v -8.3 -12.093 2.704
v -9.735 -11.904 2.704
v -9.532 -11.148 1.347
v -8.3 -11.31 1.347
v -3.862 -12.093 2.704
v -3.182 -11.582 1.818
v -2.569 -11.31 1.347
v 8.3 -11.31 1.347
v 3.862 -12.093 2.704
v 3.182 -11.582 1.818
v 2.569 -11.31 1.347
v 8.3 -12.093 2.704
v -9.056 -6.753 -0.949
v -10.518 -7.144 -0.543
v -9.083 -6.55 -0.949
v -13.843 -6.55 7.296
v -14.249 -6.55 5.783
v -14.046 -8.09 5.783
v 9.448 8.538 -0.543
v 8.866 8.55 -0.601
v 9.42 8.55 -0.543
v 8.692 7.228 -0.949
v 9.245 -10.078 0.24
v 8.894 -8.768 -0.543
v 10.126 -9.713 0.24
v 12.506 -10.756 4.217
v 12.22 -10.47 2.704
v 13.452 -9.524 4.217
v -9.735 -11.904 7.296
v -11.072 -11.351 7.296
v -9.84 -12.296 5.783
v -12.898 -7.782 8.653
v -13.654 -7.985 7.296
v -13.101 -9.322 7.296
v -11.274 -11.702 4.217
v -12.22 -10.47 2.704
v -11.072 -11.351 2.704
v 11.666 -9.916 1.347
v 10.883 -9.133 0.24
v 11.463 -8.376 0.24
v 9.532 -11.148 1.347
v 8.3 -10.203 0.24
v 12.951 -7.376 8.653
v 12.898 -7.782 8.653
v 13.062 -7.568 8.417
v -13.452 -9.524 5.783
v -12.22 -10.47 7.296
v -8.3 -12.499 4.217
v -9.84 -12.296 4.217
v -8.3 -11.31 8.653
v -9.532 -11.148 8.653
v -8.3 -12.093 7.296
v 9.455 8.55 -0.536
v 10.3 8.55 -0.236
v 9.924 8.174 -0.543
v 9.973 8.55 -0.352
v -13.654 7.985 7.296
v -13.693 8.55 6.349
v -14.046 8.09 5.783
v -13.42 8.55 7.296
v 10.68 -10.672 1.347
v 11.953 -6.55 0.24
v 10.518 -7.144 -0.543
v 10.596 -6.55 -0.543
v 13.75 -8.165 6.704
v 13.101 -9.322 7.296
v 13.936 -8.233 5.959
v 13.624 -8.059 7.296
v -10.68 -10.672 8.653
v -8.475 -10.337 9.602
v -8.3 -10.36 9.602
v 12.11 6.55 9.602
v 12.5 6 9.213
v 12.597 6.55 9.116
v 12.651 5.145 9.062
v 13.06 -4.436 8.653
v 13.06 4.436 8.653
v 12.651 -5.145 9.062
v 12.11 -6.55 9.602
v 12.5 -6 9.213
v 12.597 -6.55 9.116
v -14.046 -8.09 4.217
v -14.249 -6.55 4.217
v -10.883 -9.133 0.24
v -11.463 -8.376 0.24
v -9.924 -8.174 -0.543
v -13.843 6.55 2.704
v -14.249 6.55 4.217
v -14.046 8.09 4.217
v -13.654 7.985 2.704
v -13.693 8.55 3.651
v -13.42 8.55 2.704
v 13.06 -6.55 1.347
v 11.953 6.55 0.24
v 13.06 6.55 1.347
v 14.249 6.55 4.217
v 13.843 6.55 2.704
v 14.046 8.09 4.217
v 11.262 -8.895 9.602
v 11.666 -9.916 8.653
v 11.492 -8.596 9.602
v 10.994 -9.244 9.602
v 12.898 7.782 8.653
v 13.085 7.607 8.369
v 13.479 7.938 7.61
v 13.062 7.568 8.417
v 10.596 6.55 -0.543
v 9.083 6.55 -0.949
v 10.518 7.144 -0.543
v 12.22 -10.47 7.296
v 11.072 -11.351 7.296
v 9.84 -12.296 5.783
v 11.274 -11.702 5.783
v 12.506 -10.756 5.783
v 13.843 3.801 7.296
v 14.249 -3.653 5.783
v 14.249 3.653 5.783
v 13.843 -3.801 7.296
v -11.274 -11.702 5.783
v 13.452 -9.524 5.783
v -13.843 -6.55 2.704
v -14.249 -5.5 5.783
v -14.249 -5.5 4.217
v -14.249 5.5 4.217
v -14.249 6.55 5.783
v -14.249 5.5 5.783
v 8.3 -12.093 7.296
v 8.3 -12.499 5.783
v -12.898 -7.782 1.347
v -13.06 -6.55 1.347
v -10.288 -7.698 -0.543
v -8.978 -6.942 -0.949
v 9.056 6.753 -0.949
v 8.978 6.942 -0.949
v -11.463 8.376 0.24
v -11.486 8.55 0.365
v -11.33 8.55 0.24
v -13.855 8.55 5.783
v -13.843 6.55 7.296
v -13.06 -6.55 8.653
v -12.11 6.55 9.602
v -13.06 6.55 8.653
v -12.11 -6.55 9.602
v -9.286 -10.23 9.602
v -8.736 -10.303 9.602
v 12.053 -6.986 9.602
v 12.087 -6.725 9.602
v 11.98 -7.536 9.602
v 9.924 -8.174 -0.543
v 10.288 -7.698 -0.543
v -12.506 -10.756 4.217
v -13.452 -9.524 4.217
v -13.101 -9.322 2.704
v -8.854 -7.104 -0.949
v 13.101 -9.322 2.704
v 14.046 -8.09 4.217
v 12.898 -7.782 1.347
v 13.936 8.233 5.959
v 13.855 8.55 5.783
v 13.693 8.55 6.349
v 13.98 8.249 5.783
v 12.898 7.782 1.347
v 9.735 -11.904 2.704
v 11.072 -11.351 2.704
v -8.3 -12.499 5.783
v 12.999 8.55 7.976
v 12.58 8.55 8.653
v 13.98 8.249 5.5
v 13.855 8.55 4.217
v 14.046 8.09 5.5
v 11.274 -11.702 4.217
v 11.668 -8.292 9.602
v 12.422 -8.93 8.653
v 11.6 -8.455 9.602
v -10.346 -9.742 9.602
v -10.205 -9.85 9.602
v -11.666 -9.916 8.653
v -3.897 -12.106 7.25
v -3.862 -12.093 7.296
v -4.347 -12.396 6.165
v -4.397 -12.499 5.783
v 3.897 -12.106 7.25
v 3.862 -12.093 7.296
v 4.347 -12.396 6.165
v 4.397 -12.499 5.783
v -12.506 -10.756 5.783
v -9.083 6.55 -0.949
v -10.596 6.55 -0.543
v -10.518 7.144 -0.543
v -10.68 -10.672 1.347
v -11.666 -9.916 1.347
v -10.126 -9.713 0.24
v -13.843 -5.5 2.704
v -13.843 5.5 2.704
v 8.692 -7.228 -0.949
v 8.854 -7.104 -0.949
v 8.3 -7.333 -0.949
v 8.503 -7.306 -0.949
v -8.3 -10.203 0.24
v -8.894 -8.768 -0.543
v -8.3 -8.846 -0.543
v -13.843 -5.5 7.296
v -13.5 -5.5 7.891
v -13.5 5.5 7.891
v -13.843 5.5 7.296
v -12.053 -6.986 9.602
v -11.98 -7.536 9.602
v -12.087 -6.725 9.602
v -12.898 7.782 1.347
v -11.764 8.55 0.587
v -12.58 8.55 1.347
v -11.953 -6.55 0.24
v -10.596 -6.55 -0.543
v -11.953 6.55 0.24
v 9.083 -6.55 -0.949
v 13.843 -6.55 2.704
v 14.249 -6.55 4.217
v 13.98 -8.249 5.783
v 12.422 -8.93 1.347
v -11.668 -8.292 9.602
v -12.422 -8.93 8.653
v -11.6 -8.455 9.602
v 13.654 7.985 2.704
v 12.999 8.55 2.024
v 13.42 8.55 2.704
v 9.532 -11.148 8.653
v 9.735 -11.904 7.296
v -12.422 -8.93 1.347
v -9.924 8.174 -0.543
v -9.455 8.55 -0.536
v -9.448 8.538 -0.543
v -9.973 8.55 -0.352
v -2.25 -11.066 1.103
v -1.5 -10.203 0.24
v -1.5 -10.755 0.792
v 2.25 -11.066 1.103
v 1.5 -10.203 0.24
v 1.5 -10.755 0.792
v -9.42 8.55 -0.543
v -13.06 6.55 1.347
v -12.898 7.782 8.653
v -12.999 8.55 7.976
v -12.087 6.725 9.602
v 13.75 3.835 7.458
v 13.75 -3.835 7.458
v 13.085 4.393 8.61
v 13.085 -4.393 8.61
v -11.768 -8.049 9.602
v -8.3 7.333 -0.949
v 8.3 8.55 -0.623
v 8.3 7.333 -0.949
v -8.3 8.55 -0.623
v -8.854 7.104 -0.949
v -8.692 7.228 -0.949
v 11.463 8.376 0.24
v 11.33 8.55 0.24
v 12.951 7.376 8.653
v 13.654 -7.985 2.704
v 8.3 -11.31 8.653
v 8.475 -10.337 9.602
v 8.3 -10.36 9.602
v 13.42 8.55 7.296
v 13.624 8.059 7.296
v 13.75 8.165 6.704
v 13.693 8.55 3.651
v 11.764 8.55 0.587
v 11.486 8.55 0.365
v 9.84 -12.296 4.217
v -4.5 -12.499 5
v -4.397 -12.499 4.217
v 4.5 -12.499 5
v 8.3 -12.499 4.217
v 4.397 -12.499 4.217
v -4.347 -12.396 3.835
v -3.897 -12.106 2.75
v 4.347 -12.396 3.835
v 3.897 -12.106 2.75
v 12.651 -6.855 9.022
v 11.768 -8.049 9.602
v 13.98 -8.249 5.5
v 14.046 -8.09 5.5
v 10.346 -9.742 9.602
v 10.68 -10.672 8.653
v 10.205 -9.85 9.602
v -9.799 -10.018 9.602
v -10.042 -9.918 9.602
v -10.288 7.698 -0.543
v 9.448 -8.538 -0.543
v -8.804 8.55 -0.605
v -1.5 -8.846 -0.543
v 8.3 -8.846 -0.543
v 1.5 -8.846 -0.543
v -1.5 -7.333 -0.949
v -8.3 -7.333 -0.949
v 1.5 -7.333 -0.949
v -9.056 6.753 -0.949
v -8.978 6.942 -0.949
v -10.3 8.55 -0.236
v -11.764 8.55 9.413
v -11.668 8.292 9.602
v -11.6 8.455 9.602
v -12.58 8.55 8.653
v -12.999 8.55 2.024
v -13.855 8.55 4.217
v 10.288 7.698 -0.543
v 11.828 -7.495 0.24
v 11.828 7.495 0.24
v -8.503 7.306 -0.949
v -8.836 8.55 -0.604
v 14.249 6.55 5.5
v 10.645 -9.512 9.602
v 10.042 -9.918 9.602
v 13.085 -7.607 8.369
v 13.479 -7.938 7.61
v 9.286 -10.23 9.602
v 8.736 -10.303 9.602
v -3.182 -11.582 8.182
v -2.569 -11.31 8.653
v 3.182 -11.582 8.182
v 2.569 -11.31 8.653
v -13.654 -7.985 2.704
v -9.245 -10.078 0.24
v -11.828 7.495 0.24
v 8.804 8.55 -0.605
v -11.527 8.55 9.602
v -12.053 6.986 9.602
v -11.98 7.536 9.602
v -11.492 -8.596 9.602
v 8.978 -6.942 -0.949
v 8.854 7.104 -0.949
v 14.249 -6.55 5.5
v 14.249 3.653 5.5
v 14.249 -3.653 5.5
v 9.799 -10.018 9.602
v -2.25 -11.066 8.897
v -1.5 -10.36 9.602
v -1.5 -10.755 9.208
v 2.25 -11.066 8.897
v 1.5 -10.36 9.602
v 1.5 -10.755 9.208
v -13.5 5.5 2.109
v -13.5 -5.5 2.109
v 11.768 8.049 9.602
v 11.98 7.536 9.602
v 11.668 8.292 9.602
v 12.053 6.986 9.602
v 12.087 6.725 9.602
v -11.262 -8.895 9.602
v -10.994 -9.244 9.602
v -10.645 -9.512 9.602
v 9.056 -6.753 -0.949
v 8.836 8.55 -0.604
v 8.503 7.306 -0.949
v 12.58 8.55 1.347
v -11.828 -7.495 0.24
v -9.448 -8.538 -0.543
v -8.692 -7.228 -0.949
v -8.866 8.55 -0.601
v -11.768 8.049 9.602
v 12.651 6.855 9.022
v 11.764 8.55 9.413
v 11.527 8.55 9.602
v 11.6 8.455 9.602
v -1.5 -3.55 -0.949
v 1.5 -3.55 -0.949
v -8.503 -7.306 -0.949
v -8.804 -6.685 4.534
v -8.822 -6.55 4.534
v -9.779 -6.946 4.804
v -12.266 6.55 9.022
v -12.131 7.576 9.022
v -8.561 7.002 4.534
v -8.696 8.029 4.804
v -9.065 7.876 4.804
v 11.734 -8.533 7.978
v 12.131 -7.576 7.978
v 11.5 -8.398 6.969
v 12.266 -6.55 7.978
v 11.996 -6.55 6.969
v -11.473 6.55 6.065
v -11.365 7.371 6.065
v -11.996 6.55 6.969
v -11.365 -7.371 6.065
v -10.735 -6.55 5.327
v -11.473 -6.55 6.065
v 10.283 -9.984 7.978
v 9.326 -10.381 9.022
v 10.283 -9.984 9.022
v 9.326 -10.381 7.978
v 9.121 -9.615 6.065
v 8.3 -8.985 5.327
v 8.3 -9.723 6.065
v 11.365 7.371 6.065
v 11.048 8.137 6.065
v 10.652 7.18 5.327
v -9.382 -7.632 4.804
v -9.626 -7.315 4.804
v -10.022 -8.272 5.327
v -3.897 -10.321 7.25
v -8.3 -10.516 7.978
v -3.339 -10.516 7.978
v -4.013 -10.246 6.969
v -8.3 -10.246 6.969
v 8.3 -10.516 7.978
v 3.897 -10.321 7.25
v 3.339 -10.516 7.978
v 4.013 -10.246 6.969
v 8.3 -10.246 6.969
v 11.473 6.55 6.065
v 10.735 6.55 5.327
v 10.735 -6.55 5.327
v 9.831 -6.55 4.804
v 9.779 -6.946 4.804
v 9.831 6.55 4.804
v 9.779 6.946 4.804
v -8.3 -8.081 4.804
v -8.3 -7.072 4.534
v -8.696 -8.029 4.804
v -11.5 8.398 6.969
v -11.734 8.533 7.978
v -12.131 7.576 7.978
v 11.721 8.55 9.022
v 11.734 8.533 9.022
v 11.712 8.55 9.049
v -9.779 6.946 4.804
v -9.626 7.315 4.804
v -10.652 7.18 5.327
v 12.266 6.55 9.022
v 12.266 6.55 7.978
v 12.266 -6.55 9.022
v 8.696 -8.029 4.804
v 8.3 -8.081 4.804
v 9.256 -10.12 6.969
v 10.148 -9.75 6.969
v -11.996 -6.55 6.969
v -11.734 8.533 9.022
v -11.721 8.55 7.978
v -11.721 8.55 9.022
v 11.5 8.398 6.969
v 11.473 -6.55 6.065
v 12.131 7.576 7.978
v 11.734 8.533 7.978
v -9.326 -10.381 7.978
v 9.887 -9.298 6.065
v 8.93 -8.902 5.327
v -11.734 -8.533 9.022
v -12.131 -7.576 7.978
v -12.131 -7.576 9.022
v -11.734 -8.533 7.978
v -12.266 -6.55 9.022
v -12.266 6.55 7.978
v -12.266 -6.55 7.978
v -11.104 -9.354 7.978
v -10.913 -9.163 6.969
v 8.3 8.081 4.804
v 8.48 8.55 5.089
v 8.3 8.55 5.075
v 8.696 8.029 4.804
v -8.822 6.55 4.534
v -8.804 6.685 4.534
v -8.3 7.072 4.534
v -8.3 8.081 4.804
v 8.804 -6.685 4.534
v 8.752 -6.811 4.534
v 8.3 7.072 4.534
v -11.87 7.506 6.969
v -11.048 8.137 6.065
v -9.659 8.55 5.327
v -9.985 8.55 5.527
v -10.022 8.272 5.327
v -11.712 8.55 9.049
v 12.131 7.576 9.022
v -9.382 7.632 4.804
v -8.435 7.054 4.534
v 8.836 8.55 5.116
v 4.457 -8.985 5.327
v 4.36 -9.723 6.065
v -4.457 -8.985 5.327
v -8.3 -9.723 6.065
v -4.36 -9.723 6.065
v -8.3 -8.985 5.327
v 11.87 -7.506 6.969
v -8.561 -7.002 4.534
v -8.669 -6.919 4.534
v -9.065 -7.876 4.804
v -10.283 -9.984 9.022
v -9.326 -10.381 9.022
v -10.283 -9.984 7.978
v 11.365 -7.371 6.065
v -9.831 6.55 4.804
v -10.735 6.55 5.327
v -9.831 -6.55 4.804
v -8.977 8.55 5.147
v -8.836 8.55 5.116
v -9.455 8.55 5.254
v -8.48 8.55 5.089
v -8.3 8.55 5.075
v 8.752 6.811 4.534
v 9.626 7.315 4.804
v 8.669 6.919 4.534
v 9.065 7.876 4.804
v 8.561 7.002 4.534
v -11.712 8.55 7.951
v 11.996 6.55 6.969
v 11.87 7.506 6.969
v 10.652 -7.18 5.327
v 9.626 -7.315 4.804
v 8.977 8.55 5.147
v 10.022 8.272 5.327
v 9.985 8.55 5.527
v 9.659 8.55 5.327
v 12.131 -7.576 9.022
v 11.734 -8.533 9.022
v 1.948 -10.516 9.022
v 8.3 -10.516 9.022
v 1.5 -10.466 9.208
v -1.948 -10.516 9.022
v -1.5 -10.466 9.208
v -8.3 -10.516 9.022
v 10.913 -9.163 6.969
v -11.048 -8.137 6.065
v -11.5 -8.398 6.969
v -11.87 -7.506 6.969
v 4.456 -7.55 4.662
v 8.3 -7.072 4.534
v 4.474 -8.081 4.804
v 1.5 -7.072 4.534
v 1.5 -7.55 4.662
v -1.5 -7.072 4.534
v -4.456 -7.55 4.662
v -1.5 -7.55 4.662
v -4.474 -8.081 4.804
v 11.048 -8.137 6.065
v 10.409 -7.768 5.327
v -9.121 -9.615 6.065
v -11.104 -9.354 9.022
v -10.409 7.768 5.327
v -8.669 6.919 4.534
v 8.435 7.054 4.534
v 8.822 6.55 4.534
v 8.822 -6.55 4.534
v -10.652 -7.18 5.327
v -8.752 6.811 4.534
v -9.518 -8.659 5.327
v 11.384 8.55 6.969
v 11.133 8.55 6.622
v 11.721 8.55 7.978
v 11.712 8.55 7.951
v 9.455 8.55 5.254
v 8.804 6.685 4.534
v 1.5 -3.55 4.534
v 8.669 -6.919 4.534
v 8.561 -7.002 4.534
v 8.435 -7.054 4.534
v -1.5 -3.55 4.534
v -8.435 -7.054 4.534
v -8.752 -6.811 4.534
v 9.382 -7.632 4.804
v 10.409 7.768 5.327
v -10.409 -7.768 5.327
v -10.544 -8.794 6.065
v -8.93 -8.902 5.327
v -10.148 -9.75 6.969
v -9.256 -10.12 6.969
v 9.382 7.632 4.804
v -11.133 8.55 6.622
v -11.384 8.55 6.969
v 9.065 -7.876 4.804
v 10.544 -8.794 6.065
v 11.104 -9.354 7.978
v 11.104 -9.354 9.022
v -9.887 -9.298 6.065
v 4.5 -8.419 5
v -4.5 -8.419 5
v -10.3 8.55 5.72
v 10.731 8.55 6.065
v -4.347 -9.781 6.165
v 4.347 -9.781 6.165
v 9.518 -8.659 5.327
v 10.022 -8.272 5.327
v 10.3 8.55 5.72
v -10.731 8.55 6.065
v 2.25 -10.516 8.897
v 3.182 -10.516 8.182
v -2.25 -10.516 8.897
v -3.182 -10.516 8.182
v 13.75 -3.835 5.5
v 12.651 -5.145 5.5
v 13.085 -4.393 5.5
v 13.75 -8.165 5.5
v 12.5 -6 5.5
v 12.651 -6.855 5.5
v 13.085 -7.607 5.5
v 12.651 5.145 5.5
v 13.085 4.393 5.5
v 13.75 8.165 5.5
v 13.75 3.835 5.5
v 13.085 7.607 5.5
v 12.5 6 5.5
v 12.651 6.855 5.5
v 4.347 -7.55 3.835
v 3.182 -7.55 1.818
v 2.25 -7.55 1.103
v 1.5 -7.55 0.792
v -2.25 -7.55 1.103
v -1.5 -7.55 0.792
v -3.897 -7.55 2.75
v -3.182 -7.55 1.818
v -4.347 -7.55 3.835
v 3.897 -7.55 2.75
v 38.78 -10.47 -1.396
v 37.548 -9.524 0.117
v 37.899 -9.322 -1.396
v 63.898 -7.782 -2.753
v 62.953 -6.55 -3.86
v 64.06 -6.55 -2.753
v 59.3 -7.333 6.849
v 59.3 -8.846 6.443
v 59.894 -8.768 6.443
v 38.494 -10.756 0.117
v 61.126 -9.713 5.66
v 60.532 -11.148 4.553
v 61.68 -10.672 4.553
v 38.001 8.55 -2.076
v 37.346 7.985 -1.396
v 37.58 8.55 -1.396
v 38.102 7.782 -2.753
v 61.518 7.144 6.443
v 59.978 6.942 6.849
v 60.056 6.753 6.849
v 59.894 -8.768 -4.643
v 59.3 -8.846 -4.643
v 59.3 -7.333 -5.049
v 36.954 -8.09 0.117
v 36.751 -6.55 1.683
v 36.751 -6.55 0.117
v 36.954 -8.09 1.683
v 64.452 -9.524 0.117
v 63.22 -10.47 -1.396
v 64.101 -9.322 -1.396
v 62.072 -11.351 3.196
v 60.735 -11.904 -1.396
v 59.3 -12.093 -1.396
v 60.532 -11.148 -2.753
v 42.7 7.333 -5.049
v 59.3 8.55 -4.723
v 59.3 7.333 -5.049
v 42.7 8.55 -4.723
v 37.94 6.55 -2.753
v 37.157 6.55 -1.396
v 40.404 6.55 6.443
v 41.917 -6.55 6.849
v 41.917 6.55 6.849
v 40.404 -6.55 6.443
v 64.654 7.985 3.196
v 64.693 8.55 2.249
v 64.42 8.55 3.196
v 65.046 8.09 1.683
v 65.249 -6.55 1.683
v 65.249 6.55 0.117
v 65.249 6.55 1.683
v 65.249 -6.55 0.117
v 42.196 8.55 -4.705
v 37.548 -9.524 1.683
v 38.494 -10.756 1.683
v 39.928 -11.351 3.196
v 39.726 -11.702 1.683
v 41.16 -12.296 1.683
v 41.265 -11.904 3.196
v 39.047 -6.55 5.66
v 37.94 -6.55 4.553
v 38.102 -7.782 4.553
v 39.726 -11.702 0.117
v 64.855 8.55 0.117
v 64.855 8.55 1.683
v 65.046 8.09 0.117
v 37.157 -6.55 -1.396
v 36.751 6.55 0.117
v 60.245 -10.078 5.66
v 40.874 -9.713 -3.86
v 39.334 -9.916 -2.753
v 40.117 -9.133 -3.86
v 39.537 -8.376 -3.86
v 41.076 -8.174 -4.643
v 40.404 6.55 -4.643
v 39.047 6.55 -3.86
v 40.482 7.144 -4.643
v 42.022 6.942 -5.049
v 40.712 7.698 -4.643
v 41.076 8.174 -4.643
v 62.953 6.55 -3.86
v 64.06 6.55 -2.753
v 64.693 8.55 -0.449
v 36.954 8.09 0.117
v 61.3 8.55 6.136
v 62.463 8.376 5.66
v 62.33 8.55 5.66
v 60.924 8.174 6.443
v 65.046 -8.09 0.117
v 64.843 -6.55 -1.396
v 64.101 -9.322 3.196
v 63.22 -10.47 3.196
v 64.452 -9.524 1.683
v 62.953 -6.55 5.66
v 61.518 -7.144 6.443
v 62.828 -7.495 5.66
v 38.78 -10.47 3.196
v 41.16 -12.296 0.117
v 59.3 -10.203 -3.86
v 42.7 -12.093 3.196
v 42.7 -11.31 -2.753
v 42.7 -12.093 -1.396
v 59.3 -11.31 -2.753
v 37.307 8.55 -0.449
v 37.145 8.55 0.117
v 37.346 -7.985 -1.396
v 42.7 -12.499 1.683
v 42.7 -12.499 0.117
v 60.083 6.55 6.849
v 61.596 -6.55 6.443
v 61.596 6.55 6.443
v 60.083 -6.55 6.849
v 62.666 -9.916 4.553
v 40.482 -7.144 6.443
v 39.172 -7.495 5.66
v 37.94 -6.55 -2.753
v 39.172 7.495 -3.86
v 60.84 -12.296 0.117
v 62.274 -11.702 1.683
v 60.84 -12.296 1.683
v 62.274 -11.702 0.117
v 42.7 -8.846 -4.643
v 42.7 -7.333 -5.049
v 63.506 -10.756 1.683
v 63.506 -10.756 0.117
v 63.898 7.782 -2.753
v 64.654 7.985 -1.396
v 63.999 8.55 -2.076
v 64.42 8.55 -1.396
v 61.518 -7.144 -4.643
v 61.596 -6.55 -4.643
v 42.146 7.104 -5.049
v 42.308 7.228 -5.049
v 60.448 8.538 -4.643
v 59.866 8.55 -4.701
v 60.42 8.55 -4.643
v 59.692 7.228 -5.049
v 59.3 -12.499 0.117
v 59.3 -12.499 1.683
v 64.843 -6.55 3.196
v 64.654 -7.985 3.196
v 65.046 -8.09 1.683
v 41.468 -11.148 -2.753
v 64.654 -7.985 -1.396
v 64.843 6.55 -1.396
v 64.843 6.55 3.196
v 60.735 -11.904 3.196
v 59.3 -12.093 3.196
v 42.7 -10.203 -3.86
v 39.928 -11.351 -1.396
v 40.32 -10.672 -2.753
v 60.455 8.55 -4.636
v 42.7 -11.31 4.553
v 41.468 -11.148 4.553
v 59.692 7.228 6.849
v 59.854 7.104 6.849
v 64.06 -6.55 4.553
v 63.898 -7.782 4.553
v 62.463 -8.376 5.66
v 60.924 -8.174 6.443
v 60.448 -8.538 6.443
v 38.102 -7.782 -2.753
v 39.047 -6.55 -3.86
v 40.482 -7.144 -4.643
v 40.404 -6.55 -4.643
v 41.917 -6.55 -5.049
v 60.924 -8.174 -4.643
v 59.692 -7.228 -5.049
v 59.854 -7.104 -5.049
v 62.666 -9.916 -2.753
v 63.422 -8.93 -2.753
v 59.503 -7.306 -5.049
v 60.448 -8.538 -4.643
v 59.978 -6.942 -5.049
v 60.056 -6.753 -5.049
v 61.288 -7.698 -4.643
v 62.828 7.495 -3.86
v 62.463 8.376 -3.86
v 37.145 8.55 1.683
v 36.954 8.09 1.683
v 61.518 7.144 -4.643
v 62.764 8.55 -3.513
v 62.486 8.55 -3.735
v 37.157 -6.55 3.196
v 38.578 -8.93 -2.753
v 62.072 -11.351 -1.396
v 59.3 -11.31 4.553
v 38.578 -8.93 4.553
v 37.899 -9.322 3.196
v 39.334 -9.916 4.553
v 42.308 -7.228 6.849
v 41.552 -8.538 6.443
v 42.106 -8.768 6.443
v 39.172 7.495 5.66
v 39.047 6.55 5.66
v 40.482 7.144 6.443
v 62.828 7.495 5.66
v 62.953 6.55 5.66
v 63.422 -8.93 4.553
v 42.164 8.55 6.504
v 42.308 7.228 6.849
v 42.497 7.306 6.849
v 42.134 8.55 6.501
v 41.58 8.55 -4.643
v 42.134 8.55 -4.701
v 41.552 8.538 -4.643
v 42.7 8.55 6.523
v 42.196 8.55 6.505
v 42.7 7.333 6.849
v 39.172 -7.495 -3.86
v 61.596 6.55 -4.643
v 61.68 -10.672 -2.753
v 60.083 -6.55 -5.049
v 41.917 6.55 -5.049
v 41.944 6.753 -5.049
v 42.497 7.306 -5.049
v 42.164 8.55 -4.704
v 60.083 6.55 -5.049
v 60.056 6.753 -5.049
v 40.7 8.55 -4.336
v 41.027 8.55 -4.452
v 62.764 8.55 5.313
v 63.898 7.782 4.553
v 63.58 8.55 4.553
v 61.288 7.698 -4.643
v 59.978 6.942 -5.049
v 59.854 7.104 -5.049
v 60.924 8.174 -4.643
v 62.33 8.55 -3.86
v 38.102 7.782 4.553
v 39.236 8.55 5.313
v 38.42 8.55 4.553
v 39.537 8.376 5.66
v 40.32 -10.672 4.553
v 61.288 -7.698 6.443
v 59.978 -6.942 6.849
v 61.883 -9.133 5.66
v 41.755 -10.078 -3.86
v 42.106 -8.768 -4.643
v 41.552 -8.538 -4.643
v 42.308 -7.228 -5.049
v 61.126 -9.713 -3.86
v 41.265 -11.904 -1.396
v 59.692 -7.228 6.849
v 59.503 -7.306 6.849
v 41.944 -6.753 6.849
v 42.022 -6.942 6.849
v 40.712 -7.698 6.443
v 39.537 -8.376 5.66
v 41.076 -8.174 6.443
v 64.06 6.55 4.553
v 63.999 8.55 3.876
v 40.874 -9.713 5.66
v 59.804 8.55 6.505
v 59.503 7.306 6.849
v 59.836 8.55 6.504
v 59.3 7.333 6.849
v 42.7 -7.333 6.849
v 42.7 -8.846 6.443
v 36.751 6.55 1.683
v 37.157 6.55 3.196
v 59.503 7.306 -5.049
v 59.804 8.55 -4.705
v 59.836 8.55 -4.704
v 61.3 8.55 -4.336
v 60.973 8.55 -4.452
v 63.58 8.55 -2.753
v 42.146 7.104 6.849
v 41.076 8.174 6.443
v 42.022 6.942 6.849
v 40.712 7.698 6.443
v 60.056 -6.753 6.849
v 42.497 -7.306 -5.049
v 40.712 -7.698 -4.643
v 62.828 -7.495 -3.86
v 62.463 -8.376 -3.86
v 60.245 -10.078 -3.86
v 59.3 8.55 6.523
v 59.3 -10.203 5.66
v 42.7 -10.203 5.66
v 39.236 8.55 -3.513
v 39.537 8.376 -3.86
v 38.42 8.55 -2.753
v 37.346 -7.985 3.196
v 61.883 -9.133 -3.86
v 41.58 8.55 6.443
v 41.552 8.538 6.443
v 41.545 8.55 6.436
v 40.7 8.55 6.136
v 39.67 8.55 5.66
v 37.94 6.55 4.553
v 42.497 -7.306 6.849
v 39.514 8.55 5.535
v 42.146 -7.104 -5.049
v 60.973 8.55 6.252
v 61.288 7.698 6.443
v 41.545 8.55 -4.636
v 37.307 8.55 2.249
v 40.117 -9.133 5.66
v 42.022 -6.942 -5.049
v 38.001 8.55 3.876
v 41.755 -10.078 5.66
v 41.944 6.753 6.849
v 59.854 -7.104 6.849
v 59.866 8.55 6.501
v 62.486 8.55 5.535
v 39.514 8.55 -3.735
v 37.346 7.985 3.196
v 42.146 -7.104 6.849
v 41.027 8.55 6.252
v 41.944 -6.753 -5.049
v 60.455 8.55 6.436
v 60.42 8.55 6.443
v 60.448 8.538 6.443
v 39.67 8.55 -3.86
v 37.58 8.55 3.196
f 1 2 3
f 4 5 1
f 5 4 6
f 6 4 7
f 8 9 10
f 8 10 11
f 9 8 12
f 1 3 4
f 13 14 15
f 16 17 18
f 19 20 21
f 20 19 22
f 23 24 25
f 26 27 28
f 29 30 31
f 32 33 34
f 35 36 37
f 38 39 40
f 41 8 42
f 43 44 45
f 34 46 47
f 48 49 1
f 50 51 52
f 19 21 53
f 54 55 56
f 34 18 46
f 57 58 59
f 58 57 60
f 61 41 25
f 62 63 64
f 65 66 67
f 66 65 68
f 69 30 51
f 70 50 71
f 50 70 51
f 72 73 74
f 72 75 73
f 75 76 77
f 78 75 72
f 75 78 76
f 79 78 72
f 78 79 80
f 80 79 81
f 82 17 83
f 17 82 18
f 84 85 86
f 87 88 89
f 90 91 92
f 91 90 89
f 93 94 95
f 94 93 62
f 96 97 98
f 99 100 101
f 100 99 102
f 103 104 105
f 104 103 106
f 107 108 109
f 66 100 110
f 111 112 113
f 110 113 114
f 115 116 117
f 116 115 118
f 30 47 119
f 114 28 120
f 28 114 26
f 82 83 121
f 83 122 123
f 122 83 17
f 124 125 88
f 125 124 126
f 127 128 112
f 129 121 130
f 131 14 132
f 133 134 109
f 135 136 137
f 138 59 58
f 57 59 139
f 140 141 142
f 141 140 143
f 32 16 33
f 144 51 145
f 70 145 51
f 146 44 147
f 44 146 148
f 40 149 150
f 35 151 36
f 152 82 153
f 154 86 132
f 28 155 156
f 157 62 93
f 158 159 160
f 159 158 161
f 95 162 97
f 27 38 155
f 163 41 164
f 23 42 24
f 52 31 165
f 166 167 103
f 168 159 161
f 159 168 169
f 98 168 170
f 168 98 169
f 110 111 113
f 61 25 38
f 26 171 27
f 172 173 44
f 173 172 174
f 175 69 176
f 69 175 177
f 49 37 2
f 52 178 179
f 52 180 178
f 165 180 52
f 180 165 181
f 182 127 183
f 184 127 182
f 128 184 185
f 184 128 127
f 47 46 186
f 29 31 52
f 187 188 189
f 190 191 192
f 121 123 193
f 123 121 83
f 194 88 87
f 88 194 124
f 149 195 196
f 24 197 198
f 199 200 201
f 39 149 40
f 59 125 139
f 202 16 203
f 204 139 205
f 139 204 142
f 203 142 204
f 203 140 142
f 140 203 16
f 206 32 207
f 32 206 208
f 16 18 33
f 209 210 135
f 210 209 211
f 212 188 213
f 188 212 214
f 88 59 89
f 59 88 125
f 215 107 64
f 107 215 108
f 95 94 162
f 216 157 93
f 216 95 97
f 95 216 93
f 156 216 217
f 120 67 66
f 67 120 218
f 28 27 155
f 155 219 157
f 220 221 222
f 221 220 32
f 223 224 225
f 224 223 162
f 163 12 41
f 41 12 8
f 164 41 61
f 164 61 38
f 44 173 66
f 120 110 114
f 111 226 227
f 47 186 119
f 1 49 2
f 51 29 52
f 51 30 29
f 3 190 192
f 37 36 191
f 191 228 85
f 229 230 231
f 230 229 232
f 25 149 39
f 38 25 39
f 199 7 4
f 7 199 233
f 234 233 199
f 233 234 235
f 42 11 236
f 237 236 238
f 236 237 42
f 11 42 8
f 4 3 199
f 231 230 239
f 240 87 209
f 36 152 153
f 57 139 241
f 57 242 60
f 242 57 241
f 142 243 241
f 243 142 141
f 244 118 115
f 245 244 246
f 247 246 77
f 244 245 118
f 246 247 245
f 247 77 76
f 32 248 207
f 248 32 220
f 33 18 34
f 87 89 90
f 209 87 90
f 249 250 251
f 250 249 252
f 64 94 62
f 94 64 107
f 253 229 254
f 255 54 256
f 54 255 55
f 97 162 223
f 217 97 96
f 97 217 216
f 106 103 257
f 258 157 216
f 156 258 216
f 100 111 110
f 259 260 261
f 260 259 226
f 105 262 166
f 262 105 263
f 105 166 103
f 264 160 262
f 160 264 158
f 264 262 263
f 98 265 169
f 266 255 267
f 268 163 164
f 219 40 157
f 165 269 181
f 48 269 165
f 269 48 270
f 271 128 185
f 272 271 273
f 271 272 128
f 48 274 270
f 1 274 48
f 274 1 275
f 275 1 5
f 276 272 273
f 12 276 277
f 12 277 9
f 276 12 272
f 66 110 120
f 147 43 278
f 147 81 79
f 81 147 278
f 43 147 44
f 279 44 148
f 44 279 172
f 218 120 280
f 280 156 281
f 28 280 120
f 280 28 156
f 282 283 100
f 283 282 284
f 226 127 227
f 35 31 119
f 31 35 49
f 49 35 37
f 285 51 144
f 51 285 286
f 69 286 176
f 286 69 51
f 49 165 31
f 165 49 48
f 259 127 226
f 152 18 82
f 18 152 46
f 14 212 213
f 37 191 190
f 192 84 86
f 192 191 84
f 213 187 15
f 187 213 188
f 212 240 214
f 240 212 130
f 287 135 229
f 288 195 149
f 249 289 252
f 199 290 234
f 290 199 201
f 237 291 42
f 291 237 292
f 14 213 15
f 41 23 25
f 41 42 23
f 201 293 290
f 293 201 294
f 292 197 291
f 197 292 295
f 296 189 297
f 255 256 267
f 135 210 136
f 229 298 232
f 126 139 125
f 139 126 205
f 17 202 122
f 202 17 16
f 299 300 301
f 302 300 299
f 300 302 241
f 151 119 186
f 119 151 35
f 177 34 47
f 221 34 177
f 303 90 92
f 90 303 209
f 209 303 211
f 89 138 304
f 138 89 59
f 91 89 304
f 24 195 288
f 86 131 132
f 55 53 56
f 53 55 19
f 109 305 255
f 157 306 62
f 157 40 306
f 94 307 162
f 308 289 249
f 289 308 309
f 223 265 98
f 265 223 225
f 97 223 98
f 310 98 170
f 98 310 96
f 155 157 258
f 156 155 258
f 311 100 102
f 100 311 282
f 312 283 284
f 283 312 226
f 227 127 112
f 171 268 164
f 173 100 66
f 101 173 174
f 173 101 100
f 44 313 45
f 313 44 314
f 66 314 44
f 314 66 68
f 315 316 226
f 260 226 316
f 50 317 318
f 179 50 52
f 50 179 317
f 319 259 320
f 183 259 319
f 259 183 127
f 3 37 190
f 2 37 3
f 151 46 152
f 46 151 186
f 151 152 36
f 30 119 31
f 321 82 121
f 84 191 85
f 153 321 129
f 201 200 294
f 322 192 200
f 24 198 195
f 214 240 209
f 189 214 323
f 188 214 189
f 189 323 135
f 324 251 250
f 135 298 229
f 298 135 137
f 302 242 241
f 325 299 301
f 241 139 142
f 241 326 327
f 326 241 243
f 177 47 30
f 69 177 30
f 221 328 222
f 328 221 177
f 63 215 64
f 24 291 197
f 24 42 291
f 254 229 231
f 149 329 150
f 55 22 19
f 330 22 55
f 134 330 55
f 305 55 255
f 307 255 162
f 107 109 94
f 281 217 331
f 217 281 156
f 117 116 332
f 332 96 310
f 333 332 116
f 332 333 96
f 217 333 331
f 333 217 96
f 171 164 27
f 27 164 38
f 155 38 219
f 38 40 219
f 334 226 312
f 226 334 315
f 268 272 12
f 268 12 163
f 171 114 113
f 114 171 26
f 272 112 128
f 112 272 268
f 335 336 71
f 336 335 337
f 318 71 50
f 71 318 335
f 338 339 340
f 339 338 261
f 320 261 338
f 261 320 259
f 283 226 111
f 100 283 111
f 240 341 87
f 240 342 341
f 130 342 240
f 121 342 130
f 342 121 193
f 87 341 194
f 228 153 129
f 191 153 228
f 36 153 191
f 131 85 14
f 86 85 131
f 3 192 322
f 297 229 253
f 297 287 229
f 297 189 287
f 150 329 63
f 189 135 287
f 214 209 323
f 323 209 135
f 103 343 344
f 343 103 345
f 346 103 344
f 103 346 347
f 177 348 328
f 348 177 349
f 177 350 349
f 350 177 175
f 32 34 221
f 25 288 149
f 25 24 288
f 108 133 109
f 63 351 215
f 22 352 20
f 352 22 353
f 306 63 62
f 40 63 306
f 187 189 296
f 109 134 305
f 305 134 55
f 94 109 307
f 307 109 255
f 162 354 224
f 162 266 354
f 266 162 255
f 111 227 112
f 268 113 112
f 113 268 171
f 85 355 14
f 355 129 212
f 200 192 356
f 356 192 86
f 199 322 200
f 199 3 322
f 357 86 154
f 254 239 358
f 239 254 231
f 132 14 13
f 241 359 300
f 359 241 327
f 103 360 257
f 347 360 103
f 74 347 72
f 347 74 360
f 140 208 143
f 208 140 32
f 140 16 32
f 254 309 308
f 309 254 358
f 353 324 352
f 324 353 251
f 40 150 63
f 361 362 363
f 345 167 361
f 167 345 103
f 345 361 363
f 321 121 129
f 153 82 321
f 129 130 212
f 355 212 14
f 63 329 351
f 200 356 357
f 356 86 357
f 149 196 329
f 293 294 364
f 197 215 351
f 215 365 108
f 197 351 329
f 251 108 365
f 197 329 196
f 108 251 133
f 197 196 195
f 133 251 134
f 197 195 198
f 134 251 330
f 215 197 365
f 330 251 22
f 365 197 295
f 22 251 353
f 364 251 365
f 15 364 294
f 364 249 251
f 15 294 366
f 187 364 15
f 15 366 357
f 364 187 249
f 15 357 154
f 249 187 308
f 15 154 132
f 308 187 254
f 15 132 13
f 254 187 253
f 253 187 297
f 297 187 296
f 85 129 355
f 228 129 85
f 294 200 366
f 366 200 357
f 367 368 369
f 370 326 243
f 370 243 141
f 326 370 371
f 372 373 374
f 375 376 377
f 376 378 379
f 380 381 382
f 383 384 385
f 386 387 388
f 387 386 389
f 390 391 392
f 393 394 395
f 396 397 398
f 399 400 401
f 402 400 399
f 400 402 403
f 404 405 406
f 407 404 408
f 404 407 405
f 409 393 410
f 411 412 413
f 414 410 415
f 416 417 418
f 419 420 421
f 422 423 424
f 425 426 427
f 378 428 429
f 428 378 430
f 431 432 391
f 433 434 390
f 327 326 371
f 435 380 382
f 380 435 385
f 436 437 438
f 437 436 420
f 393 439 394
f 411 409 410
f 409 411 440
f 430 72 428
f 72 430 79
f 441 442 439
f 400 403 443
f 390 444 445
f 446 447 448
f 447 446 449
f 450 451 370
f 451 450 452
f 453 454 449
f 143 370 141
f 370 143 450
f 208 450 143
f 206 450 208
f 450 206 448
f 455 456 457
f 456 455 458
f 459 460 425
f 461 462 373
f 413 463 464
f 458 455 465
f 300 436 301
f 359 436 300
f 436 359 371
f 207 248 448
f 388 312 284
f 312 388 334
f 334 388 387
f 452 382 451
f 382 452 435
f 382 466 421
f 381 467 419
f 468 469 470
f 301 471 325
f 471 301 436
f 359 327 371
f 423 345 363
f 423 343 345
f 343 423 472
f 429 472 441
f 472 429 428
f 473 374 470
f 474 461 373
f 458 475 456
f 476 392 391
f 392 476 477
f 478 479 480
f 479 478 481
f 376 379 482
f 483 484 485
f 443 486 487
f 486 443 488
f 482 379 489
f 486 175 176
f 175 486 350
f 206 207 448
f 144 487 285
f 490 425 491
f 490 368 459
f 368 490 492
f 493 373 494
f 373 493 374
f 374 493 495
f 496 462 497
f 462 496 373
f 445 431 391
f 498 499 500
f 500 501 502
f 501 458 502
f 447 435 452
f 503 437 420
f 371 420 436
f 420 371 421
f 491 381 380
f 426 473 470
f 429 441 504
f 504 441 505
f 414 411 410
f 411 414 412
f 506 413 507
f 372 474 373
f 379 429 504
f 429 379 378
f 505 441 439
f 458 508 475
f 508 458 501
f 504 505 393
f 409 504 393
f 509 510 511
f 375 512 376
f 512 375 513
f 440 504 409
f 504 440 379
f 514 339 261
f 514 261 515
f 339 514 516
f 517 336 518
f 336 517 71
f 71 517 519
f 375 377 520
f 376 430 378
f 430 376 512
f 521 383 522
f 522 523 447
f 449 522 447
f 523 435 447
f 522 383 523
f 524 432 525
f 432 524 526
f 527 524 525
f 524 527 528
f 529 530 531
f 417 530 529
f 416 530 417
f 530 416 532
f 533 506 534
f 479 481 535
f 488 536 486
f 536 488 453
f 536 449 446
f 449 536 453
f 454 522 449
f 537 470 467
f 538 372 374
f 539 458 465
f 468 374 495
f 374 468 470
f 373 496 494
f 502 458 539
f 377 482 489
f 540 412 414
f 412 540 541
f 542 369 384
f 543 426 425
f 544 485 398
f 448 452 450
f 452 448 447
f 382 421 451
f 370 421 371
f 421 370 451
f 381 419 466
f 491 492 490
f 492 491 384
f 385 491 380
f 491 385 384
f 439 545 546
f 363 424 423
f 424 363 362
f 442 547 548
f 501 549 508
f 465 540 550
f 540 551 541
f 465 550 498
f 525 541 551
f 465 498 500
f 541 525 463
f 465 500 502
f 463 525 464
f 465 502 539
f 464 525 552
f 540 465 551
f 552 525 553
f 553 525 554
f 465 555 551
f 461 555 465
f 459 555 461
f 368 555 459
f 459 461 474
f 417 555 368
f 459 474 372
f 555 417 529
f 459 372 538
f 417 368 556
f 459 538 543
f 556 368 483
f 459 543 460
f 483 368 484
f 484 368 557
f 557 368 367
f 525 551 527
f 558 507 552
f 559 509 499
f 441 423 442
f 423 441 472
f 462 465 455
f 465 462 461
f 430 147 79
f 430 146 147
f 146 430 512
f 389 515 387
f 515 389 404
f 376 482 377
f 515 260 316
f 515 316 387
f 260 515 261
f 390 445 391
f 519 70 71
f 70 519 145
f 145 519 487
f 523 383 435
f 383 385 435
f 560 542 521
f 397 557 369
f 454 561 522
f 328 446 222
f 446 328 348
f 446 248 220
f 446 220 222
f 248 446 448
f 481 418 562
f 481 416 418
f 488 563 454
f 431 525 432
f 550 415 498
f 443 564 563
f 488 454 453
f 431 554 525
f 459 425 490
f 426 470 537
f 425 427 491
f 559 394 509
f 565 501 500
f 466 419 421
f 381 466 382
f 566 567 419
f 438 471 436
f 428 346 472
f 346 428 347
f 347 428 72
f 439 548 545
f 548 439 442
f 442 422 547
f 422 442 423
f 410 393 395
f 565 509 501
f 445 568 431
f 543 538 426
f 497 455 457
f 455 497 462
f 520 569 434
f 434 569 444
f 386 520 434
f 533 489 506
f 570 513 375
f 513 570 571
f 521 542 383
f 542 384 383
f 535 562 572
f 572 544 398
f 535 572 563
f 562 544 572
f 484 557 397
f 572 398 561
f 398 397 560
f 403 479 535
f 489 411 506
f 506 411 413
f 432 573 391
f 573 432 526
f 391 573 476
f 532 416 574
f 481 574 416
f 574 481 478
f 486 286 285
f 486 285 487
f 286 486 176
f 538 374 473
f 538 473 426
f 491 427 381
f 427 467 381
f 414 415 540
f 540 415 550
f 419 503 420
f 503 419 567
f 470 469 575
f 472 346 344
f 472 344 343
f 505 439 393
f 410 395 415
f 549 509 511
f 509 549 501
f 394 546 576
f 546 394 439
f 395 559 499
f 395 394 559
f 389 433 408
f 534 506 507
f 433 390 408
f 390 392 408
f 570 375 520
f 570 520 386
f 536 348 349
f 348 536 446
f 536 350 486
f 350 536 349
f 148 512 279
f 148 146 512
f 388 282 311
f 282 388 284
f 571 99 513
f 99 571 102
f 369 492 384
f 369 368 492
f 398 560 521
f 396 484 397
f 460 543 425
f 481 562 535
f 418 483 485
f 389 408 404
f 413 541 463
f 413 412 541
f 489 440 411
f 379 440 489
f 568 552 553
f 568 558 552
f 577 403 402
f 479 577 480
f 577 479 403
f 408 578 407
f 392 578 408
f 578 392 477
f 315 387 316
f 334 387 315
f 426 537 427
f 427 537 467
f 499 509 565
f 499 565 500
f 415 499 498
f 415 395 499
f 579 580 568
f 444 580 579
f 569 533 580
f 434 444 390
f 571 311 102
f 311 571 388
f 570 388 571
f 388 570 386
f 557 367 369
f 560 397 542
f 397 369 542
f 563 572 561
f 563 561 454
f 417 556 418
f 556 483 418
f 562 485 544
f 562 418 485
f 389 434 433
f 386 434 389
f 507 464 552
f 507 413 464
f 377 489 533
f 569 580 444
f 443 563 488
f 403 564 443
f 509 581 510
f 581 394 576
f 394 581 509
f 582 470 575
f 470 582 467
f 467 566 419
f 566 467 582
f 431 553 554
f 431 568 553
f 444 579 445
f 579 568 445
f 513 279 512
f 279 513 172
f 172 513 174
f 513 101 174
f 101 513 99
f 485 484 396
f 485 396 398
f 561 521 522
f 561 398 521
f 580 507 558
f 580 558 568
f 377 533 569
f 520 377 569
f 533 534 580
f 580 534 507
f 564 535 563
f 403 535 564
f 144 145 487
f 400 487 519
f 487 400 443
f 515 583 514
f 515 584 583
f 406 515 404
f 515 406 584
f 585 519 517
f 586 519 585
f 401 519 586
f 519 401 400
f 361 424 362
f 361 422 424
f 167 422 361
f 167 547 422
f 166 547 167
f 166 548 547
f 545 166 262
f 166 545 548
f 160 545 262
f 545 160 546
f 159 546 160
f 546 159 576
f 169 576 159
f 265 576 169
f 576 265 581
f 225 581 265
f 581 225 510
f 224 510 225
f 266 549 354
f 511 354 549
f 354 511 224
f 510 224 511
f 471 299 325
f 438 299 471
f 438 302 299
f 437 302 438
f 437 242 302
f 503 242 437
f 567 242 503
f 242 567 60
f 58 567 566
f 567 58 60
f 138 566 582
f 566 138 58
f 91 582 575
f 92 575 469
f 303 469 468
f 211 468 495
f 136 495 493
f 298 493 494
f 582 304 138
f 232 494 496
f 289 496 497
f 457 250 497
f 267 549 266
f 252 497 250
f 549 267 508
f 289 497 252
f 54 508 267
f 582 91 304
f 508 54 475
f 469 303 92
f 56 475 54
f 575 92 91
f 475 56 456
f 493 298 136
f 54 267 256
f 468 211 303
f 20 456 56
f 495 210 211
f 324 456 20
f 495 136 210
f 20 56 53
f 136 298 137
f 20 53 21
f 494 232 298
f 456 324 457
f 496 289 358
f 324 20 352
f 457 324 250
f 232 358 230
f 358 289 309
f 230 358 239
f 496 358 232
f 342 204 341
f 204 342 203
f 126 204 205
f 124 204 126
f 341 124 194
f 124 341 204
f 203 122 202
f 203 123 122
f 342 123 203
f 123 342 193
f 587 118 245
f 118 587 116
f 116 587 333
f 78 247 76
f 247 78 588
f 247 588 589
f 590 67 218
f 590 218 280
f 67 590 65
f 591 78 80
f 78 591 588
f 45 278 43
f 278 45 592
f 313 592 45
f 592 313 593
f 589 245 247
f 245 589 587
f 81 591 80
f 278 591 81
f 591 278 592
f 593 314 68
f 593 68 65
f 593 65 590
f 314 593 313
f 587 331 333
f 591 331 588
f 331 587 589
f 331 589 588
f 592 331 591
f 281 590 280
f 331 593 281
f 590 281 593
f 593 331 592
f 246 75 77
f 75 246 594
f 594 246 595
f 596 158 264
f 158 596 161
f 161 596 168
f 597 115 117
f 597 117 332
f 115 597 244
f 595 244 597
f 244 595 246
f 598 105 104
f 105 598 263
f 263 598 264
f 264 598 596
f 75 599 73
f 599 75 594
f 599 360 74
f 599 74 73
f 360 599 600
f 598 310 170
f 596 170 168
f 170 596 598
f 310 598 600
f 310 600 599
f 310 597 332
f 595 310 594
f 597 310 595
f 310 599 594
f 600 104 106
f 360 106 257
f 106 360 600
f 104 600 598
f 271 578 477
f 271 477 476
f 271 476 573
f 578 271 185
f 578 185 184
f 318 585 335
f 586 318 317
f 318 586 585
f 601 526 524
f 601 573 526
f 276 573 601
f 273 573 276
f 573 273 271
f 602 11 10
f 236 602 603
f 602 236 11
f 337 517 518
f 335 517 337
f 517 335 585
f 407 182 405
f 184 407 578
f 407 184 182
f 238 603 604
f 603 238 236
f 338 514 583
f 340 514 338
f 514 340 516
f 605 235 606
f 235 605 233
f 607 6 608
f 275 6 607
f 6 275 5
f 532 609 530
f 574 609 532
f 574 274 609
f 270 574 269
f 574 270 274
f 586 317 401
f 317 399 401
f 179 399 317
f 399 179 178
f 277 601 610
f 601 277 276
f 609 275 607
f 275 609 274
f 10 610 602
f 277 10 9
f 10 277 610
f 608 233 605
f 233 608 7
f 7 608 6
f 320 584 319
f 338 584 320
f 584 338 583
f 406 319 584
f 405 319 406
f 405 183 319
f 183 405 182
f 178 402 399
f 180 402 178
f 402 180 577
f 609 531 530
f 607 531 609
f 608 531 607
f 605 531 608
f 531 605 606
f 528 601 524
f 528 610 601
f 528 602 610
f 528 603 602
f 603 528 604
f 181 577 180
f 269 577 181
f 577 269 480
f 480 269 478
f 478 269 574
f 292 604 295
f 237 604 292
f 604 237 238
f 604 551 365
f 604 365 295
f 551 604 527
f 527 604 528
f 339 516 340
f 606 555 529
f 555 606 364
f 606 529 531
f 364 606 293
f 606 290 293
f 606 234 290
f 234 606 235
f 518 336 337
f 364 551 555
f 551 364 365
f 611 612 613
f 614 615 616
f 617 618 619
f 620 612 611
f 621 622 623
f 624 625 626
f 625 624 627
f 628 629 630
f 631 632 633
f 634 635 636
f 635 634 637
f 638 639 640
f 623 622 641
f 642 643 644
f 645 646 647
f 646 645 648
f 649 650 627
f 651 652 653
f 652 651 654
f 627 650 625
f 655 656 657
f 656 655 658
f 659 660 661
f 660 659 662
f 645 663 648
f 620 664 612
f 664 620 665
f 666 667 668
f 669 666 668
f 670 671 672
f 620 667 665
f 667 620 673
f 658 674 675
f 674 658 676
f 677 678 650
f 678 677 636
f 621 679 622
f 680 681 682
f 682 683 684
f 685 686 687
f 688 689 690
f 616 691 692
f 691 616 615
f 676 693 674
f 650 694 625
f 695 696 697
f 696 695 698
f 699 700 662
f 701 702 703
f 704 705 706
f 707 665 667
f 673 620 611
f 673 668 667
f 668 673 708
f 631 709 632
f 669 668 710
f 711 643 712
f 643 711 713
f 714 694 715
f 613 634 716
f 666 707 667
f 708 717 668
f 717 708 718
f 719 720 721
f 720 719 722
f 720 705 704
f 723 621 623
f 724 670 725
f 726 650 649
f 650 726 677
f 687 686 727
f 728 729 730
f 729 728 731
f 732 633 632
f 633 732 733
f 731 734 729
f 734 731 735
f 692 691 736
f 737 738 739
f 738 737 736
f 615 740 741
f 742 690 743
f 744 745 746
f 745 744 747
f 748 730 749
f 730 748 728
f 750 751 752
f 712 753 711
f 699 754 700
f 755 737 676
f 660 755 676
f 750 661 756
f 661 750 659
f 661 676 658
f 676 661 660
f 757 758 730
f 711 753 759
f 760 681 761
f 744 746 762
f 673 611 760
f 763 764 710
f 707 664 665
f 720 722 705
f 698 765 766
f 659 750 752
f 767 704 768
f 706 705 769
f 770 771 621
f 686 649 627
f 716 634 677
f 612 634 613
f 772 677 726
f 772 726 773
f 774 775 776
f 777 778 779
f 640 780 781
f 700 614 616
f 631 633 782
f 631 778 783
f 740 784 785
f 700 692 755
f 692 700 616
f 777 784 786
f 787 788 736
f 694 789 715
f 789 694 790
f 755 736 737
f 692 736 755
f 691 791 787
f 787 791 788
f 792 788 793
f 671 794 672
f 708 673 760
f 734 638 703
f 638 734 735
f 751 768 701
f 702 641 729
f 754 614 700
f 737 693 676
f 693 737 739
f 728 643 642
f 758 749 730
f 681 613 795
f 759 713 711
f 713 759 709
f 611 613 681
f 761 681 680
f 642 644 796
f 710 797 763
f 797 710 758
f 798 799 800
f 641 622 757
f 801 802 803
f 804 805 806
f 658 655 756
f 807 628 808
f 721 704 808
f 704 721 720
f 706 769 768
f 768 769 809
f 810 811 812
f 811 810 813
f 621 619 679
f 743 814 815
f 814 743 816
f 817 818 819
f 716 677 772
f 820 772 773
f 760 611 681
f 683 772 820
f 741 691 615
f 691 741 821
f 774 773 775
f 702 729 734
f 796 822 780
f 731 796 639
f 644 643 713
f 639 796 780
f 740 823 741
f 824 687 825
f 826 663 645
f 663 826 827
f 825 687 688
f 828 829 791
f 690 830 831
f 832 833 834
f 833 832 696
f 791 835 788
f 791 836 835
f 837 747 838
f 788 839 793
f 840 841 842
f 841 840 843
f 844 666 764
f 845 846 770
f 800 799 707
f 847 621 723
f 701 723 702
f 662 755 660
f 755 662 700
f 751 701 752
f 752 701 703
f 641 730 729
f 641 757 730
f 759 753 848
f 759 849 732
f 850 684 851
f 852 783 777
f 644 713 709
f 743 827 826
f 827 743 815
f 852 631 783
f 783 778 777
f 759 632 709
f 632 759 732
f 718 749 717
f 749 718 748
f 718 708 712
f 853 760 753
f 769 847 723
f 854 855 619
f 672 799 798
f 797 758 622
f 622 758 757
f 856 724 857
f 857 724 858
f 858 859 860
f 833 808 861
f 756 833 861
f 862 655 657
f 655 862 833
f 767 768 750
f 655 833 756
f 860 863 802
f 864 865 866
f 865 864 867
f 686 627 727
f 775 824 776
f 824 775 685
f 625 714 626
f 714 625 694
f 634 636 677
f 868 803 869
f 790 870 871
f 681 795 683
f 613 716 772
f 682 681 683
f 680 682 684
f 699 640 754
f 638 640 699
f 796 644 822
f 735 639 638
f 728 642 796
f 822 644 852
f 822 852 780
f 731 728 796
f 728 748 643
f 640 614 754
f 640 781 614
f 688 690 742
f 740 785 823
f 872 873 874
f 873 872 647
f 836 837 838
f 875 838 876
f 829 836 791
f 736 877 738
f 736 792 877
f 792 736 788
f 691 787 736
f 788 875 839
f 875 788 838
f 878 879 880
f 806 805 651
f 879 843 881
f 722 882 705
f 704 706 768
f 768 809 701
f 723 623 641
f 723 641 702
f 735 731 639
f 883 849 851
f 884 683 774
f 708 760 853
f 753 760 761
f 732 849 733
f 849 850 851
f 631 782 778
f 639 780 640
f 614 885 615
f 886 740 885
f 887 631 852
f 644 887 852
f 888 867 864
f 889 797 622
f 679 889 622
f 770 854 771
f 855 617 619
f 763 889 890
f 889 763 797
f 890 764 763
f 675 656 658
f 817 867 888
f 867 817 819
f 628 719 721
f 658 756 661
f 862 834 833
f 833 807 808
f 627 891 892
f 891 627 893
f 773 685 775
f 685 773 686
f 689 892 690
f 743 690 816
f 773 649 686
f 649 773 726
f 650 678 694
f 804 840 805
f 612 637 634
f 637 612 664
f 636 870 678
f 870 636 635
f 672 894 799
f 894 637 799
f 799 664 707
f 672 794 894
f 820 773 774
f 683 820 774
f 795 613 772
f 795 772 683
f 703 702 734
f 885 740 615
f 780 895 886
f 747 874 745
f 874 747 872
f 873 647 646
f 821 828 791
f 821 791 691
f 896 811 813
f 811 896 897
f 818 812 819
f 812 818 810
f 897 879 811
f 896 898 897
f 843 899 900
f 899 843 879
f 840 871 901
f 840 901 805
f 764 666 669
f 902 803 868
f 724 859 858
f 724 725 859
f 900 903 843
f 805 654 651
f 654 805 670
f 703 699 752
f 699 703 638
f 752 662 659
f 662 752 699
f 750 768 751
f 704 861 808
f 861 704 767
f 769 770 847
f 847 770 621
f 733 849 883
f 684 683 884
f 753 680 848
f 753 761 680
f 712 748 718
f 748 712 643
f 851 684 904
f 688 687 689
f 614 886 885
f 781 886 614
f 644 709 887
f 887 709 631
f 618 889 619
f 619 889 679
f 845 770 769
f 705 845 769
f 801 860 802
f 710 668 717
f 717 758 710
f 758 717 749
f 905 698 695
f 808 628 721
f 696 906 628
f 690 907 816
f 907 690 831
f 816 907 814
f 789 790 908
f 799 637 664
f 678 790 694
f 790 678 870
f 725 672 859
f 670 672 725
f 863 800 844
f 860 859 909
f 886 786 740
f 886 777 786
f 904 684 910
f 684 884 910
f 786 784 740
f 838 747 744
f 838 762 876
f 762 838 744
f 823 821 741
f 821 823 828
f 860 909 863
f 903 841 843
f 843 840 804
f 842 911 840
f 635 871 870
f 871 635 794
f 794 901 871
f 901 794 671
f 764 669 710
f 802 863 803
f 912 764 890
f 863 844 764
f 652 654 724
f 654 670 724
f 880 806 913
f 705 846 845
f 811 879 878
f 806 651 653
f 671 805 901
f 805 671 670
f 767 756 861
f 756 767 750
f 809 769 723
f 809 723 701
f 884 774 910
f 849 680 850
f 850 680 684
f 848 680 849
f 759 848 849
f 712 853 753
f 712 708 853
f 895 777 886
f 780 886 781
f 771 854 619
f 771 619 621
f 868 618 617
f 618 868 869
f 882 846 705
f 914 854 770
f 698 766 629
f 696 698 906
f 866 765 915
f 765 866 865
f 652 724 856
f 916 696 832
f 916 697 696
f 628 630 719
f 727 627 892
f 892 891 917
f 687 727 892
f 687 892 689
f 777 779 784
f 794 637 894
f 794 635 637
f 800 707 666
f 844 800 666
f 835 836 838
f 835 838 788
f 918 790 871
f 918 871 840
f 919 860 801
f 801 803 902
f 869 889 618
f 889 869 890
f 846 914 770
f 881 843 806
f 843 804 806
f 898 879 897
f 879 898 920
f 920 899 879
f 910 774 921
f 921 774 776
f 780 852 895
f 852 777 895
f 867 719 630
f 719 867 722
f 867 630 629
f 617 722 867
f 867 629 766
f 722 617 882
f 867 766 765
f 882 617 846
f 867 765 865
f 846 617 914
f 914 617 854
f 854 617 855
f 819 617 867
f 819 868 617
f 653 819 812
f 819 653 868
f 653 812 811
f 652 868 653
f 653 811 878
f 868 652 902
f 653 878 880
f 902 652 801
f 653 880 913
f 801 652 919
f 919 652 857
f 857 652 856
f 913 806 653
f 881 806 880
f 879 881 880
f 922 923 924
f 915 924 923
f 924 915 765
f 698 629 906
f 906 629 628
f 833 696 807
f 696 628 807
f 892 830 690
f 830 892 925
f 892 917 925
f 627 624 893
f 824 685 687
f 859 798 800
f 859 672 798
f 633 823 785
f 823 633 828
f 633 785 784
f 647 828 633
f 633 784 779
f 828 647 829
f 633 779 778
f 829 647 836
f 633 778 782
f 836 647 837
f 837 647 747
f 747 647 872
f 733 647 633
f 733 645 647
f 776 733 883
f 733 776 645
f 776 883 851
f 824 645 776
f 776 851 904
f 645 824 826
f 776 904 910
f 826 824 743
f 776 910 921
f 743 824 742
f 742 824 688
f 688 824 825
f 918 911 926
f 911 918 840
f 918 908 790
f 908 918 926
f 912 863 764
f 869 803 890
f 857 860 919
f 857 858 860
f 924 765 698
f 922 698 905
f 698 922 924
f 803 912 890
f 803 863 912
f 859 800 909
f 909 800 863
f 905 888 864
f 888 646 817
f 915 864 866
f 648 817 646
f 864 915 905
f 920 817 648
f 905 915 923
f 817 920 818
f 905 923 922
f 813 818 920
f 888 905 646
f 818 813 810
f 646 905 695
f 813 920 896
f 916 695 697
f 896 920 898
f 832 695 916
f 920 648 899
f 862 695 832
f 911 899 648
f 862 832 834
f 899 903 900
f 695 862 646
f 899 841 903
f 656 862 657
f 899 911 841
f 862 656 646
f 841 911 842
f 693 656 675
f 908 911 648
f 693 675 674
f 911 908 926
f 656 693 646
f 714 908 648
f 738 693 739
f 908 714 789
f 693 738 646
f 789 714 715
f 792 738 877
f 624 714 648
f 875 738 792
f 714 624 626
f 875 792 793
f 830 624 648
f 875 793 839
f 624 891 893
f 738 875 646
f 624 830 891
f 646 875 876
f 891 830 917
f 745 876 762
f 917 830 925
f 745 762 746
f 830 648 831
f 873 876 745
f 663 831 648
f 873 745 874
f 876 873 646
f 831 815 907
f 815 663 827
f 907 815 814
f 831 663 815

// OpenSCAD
// Cyclops XIAO — V4 "Temple"
// Glasses-temple clip: low-profile lozenge that hugs a glasses arm. A sprung
// clip channel on the back slips over a 4-6 mm temple; board sits flat, screen
// faces forward. Lightest, most discreet variant.
//
// Render: openscad cyclops_xiao_v4_temple.scad
// Export: openscad -D 'PART="body"' -o v4_body.stl cyclops_xiao_v4_temple.scad

xiao_l = 21.0; xiao_w = 17.5; wall = 1.8;
base_h = 5.0; body_h = 10.0;
win_w = 28.0; win_h = 28.0;
$fn = 40;

module lozenge(l,w,h,r){
  hull(){
    for(x=[-1,1], y=[-1,1])
      translate([x*(l/2-r), y*(w/2-r), h/2]) sphere(r=r,$fn=24);
  }
}

module body(){
  difference(){
    union(){
      lozenge(xiao_l+2*wall+4, xiao_w+2*wall+4, body_h, 6);
    }
    // interior pocket
    translate([0,0,base_h]) lozenge(xiao_l+2*wall, xiao_w+2*wall, body_h-base_h+2, 4);
    // screen window (forward face = +Y, so screen points away from temple)
    translate([0, xiao_w/2+wall+1, body_h/2]) cube([win_w, 6, win_h], center=true);
    // USB-C at -X end
    translate([-16,0,base_h]) cube([5,11,7], center=true);
    // buttons +X end
    translate([15,-6,body_h-2]) cylinder(d=5,h=5,$fn=18,center=true);
    translate([15, 6,body_h-2]) cylinder(d=5,h=5,$fn=18,center=true);
    // --- clip channel on back (-Y) for temple arm ---
    // a C-channel: subtract a curved slot
    translate([0, -(xiao_w/2+wall+1), body_h/2]) rotate([90,0,0])
      cylinder(d=9, h=8, center=true, $fn=24);
    // slot opening (vertical slit so arm slides in)
    translate([0, -(xiao_w/2+wall-1), body_h/2]) cube([3, 12, 30], center=true);
  }
}

module lid(){
  // front face plate (covers screen side)
  difference(){
    lozenge(xiao_l+2*wall+4, xiao_w+2*wall+4, 1.8, 6);
    translate([0, xiao_w/2+wall+1, body_h/2]) cube([win_w, 6, win_h], center=true);
  }
}

PART = undef;
if (!is_undef(PART) && PART=="body") body();
else if (!is_undef(PART) && PART=="lid") lid();
else { body(); translate([xiao_l+30,0,0]) lid(); }
